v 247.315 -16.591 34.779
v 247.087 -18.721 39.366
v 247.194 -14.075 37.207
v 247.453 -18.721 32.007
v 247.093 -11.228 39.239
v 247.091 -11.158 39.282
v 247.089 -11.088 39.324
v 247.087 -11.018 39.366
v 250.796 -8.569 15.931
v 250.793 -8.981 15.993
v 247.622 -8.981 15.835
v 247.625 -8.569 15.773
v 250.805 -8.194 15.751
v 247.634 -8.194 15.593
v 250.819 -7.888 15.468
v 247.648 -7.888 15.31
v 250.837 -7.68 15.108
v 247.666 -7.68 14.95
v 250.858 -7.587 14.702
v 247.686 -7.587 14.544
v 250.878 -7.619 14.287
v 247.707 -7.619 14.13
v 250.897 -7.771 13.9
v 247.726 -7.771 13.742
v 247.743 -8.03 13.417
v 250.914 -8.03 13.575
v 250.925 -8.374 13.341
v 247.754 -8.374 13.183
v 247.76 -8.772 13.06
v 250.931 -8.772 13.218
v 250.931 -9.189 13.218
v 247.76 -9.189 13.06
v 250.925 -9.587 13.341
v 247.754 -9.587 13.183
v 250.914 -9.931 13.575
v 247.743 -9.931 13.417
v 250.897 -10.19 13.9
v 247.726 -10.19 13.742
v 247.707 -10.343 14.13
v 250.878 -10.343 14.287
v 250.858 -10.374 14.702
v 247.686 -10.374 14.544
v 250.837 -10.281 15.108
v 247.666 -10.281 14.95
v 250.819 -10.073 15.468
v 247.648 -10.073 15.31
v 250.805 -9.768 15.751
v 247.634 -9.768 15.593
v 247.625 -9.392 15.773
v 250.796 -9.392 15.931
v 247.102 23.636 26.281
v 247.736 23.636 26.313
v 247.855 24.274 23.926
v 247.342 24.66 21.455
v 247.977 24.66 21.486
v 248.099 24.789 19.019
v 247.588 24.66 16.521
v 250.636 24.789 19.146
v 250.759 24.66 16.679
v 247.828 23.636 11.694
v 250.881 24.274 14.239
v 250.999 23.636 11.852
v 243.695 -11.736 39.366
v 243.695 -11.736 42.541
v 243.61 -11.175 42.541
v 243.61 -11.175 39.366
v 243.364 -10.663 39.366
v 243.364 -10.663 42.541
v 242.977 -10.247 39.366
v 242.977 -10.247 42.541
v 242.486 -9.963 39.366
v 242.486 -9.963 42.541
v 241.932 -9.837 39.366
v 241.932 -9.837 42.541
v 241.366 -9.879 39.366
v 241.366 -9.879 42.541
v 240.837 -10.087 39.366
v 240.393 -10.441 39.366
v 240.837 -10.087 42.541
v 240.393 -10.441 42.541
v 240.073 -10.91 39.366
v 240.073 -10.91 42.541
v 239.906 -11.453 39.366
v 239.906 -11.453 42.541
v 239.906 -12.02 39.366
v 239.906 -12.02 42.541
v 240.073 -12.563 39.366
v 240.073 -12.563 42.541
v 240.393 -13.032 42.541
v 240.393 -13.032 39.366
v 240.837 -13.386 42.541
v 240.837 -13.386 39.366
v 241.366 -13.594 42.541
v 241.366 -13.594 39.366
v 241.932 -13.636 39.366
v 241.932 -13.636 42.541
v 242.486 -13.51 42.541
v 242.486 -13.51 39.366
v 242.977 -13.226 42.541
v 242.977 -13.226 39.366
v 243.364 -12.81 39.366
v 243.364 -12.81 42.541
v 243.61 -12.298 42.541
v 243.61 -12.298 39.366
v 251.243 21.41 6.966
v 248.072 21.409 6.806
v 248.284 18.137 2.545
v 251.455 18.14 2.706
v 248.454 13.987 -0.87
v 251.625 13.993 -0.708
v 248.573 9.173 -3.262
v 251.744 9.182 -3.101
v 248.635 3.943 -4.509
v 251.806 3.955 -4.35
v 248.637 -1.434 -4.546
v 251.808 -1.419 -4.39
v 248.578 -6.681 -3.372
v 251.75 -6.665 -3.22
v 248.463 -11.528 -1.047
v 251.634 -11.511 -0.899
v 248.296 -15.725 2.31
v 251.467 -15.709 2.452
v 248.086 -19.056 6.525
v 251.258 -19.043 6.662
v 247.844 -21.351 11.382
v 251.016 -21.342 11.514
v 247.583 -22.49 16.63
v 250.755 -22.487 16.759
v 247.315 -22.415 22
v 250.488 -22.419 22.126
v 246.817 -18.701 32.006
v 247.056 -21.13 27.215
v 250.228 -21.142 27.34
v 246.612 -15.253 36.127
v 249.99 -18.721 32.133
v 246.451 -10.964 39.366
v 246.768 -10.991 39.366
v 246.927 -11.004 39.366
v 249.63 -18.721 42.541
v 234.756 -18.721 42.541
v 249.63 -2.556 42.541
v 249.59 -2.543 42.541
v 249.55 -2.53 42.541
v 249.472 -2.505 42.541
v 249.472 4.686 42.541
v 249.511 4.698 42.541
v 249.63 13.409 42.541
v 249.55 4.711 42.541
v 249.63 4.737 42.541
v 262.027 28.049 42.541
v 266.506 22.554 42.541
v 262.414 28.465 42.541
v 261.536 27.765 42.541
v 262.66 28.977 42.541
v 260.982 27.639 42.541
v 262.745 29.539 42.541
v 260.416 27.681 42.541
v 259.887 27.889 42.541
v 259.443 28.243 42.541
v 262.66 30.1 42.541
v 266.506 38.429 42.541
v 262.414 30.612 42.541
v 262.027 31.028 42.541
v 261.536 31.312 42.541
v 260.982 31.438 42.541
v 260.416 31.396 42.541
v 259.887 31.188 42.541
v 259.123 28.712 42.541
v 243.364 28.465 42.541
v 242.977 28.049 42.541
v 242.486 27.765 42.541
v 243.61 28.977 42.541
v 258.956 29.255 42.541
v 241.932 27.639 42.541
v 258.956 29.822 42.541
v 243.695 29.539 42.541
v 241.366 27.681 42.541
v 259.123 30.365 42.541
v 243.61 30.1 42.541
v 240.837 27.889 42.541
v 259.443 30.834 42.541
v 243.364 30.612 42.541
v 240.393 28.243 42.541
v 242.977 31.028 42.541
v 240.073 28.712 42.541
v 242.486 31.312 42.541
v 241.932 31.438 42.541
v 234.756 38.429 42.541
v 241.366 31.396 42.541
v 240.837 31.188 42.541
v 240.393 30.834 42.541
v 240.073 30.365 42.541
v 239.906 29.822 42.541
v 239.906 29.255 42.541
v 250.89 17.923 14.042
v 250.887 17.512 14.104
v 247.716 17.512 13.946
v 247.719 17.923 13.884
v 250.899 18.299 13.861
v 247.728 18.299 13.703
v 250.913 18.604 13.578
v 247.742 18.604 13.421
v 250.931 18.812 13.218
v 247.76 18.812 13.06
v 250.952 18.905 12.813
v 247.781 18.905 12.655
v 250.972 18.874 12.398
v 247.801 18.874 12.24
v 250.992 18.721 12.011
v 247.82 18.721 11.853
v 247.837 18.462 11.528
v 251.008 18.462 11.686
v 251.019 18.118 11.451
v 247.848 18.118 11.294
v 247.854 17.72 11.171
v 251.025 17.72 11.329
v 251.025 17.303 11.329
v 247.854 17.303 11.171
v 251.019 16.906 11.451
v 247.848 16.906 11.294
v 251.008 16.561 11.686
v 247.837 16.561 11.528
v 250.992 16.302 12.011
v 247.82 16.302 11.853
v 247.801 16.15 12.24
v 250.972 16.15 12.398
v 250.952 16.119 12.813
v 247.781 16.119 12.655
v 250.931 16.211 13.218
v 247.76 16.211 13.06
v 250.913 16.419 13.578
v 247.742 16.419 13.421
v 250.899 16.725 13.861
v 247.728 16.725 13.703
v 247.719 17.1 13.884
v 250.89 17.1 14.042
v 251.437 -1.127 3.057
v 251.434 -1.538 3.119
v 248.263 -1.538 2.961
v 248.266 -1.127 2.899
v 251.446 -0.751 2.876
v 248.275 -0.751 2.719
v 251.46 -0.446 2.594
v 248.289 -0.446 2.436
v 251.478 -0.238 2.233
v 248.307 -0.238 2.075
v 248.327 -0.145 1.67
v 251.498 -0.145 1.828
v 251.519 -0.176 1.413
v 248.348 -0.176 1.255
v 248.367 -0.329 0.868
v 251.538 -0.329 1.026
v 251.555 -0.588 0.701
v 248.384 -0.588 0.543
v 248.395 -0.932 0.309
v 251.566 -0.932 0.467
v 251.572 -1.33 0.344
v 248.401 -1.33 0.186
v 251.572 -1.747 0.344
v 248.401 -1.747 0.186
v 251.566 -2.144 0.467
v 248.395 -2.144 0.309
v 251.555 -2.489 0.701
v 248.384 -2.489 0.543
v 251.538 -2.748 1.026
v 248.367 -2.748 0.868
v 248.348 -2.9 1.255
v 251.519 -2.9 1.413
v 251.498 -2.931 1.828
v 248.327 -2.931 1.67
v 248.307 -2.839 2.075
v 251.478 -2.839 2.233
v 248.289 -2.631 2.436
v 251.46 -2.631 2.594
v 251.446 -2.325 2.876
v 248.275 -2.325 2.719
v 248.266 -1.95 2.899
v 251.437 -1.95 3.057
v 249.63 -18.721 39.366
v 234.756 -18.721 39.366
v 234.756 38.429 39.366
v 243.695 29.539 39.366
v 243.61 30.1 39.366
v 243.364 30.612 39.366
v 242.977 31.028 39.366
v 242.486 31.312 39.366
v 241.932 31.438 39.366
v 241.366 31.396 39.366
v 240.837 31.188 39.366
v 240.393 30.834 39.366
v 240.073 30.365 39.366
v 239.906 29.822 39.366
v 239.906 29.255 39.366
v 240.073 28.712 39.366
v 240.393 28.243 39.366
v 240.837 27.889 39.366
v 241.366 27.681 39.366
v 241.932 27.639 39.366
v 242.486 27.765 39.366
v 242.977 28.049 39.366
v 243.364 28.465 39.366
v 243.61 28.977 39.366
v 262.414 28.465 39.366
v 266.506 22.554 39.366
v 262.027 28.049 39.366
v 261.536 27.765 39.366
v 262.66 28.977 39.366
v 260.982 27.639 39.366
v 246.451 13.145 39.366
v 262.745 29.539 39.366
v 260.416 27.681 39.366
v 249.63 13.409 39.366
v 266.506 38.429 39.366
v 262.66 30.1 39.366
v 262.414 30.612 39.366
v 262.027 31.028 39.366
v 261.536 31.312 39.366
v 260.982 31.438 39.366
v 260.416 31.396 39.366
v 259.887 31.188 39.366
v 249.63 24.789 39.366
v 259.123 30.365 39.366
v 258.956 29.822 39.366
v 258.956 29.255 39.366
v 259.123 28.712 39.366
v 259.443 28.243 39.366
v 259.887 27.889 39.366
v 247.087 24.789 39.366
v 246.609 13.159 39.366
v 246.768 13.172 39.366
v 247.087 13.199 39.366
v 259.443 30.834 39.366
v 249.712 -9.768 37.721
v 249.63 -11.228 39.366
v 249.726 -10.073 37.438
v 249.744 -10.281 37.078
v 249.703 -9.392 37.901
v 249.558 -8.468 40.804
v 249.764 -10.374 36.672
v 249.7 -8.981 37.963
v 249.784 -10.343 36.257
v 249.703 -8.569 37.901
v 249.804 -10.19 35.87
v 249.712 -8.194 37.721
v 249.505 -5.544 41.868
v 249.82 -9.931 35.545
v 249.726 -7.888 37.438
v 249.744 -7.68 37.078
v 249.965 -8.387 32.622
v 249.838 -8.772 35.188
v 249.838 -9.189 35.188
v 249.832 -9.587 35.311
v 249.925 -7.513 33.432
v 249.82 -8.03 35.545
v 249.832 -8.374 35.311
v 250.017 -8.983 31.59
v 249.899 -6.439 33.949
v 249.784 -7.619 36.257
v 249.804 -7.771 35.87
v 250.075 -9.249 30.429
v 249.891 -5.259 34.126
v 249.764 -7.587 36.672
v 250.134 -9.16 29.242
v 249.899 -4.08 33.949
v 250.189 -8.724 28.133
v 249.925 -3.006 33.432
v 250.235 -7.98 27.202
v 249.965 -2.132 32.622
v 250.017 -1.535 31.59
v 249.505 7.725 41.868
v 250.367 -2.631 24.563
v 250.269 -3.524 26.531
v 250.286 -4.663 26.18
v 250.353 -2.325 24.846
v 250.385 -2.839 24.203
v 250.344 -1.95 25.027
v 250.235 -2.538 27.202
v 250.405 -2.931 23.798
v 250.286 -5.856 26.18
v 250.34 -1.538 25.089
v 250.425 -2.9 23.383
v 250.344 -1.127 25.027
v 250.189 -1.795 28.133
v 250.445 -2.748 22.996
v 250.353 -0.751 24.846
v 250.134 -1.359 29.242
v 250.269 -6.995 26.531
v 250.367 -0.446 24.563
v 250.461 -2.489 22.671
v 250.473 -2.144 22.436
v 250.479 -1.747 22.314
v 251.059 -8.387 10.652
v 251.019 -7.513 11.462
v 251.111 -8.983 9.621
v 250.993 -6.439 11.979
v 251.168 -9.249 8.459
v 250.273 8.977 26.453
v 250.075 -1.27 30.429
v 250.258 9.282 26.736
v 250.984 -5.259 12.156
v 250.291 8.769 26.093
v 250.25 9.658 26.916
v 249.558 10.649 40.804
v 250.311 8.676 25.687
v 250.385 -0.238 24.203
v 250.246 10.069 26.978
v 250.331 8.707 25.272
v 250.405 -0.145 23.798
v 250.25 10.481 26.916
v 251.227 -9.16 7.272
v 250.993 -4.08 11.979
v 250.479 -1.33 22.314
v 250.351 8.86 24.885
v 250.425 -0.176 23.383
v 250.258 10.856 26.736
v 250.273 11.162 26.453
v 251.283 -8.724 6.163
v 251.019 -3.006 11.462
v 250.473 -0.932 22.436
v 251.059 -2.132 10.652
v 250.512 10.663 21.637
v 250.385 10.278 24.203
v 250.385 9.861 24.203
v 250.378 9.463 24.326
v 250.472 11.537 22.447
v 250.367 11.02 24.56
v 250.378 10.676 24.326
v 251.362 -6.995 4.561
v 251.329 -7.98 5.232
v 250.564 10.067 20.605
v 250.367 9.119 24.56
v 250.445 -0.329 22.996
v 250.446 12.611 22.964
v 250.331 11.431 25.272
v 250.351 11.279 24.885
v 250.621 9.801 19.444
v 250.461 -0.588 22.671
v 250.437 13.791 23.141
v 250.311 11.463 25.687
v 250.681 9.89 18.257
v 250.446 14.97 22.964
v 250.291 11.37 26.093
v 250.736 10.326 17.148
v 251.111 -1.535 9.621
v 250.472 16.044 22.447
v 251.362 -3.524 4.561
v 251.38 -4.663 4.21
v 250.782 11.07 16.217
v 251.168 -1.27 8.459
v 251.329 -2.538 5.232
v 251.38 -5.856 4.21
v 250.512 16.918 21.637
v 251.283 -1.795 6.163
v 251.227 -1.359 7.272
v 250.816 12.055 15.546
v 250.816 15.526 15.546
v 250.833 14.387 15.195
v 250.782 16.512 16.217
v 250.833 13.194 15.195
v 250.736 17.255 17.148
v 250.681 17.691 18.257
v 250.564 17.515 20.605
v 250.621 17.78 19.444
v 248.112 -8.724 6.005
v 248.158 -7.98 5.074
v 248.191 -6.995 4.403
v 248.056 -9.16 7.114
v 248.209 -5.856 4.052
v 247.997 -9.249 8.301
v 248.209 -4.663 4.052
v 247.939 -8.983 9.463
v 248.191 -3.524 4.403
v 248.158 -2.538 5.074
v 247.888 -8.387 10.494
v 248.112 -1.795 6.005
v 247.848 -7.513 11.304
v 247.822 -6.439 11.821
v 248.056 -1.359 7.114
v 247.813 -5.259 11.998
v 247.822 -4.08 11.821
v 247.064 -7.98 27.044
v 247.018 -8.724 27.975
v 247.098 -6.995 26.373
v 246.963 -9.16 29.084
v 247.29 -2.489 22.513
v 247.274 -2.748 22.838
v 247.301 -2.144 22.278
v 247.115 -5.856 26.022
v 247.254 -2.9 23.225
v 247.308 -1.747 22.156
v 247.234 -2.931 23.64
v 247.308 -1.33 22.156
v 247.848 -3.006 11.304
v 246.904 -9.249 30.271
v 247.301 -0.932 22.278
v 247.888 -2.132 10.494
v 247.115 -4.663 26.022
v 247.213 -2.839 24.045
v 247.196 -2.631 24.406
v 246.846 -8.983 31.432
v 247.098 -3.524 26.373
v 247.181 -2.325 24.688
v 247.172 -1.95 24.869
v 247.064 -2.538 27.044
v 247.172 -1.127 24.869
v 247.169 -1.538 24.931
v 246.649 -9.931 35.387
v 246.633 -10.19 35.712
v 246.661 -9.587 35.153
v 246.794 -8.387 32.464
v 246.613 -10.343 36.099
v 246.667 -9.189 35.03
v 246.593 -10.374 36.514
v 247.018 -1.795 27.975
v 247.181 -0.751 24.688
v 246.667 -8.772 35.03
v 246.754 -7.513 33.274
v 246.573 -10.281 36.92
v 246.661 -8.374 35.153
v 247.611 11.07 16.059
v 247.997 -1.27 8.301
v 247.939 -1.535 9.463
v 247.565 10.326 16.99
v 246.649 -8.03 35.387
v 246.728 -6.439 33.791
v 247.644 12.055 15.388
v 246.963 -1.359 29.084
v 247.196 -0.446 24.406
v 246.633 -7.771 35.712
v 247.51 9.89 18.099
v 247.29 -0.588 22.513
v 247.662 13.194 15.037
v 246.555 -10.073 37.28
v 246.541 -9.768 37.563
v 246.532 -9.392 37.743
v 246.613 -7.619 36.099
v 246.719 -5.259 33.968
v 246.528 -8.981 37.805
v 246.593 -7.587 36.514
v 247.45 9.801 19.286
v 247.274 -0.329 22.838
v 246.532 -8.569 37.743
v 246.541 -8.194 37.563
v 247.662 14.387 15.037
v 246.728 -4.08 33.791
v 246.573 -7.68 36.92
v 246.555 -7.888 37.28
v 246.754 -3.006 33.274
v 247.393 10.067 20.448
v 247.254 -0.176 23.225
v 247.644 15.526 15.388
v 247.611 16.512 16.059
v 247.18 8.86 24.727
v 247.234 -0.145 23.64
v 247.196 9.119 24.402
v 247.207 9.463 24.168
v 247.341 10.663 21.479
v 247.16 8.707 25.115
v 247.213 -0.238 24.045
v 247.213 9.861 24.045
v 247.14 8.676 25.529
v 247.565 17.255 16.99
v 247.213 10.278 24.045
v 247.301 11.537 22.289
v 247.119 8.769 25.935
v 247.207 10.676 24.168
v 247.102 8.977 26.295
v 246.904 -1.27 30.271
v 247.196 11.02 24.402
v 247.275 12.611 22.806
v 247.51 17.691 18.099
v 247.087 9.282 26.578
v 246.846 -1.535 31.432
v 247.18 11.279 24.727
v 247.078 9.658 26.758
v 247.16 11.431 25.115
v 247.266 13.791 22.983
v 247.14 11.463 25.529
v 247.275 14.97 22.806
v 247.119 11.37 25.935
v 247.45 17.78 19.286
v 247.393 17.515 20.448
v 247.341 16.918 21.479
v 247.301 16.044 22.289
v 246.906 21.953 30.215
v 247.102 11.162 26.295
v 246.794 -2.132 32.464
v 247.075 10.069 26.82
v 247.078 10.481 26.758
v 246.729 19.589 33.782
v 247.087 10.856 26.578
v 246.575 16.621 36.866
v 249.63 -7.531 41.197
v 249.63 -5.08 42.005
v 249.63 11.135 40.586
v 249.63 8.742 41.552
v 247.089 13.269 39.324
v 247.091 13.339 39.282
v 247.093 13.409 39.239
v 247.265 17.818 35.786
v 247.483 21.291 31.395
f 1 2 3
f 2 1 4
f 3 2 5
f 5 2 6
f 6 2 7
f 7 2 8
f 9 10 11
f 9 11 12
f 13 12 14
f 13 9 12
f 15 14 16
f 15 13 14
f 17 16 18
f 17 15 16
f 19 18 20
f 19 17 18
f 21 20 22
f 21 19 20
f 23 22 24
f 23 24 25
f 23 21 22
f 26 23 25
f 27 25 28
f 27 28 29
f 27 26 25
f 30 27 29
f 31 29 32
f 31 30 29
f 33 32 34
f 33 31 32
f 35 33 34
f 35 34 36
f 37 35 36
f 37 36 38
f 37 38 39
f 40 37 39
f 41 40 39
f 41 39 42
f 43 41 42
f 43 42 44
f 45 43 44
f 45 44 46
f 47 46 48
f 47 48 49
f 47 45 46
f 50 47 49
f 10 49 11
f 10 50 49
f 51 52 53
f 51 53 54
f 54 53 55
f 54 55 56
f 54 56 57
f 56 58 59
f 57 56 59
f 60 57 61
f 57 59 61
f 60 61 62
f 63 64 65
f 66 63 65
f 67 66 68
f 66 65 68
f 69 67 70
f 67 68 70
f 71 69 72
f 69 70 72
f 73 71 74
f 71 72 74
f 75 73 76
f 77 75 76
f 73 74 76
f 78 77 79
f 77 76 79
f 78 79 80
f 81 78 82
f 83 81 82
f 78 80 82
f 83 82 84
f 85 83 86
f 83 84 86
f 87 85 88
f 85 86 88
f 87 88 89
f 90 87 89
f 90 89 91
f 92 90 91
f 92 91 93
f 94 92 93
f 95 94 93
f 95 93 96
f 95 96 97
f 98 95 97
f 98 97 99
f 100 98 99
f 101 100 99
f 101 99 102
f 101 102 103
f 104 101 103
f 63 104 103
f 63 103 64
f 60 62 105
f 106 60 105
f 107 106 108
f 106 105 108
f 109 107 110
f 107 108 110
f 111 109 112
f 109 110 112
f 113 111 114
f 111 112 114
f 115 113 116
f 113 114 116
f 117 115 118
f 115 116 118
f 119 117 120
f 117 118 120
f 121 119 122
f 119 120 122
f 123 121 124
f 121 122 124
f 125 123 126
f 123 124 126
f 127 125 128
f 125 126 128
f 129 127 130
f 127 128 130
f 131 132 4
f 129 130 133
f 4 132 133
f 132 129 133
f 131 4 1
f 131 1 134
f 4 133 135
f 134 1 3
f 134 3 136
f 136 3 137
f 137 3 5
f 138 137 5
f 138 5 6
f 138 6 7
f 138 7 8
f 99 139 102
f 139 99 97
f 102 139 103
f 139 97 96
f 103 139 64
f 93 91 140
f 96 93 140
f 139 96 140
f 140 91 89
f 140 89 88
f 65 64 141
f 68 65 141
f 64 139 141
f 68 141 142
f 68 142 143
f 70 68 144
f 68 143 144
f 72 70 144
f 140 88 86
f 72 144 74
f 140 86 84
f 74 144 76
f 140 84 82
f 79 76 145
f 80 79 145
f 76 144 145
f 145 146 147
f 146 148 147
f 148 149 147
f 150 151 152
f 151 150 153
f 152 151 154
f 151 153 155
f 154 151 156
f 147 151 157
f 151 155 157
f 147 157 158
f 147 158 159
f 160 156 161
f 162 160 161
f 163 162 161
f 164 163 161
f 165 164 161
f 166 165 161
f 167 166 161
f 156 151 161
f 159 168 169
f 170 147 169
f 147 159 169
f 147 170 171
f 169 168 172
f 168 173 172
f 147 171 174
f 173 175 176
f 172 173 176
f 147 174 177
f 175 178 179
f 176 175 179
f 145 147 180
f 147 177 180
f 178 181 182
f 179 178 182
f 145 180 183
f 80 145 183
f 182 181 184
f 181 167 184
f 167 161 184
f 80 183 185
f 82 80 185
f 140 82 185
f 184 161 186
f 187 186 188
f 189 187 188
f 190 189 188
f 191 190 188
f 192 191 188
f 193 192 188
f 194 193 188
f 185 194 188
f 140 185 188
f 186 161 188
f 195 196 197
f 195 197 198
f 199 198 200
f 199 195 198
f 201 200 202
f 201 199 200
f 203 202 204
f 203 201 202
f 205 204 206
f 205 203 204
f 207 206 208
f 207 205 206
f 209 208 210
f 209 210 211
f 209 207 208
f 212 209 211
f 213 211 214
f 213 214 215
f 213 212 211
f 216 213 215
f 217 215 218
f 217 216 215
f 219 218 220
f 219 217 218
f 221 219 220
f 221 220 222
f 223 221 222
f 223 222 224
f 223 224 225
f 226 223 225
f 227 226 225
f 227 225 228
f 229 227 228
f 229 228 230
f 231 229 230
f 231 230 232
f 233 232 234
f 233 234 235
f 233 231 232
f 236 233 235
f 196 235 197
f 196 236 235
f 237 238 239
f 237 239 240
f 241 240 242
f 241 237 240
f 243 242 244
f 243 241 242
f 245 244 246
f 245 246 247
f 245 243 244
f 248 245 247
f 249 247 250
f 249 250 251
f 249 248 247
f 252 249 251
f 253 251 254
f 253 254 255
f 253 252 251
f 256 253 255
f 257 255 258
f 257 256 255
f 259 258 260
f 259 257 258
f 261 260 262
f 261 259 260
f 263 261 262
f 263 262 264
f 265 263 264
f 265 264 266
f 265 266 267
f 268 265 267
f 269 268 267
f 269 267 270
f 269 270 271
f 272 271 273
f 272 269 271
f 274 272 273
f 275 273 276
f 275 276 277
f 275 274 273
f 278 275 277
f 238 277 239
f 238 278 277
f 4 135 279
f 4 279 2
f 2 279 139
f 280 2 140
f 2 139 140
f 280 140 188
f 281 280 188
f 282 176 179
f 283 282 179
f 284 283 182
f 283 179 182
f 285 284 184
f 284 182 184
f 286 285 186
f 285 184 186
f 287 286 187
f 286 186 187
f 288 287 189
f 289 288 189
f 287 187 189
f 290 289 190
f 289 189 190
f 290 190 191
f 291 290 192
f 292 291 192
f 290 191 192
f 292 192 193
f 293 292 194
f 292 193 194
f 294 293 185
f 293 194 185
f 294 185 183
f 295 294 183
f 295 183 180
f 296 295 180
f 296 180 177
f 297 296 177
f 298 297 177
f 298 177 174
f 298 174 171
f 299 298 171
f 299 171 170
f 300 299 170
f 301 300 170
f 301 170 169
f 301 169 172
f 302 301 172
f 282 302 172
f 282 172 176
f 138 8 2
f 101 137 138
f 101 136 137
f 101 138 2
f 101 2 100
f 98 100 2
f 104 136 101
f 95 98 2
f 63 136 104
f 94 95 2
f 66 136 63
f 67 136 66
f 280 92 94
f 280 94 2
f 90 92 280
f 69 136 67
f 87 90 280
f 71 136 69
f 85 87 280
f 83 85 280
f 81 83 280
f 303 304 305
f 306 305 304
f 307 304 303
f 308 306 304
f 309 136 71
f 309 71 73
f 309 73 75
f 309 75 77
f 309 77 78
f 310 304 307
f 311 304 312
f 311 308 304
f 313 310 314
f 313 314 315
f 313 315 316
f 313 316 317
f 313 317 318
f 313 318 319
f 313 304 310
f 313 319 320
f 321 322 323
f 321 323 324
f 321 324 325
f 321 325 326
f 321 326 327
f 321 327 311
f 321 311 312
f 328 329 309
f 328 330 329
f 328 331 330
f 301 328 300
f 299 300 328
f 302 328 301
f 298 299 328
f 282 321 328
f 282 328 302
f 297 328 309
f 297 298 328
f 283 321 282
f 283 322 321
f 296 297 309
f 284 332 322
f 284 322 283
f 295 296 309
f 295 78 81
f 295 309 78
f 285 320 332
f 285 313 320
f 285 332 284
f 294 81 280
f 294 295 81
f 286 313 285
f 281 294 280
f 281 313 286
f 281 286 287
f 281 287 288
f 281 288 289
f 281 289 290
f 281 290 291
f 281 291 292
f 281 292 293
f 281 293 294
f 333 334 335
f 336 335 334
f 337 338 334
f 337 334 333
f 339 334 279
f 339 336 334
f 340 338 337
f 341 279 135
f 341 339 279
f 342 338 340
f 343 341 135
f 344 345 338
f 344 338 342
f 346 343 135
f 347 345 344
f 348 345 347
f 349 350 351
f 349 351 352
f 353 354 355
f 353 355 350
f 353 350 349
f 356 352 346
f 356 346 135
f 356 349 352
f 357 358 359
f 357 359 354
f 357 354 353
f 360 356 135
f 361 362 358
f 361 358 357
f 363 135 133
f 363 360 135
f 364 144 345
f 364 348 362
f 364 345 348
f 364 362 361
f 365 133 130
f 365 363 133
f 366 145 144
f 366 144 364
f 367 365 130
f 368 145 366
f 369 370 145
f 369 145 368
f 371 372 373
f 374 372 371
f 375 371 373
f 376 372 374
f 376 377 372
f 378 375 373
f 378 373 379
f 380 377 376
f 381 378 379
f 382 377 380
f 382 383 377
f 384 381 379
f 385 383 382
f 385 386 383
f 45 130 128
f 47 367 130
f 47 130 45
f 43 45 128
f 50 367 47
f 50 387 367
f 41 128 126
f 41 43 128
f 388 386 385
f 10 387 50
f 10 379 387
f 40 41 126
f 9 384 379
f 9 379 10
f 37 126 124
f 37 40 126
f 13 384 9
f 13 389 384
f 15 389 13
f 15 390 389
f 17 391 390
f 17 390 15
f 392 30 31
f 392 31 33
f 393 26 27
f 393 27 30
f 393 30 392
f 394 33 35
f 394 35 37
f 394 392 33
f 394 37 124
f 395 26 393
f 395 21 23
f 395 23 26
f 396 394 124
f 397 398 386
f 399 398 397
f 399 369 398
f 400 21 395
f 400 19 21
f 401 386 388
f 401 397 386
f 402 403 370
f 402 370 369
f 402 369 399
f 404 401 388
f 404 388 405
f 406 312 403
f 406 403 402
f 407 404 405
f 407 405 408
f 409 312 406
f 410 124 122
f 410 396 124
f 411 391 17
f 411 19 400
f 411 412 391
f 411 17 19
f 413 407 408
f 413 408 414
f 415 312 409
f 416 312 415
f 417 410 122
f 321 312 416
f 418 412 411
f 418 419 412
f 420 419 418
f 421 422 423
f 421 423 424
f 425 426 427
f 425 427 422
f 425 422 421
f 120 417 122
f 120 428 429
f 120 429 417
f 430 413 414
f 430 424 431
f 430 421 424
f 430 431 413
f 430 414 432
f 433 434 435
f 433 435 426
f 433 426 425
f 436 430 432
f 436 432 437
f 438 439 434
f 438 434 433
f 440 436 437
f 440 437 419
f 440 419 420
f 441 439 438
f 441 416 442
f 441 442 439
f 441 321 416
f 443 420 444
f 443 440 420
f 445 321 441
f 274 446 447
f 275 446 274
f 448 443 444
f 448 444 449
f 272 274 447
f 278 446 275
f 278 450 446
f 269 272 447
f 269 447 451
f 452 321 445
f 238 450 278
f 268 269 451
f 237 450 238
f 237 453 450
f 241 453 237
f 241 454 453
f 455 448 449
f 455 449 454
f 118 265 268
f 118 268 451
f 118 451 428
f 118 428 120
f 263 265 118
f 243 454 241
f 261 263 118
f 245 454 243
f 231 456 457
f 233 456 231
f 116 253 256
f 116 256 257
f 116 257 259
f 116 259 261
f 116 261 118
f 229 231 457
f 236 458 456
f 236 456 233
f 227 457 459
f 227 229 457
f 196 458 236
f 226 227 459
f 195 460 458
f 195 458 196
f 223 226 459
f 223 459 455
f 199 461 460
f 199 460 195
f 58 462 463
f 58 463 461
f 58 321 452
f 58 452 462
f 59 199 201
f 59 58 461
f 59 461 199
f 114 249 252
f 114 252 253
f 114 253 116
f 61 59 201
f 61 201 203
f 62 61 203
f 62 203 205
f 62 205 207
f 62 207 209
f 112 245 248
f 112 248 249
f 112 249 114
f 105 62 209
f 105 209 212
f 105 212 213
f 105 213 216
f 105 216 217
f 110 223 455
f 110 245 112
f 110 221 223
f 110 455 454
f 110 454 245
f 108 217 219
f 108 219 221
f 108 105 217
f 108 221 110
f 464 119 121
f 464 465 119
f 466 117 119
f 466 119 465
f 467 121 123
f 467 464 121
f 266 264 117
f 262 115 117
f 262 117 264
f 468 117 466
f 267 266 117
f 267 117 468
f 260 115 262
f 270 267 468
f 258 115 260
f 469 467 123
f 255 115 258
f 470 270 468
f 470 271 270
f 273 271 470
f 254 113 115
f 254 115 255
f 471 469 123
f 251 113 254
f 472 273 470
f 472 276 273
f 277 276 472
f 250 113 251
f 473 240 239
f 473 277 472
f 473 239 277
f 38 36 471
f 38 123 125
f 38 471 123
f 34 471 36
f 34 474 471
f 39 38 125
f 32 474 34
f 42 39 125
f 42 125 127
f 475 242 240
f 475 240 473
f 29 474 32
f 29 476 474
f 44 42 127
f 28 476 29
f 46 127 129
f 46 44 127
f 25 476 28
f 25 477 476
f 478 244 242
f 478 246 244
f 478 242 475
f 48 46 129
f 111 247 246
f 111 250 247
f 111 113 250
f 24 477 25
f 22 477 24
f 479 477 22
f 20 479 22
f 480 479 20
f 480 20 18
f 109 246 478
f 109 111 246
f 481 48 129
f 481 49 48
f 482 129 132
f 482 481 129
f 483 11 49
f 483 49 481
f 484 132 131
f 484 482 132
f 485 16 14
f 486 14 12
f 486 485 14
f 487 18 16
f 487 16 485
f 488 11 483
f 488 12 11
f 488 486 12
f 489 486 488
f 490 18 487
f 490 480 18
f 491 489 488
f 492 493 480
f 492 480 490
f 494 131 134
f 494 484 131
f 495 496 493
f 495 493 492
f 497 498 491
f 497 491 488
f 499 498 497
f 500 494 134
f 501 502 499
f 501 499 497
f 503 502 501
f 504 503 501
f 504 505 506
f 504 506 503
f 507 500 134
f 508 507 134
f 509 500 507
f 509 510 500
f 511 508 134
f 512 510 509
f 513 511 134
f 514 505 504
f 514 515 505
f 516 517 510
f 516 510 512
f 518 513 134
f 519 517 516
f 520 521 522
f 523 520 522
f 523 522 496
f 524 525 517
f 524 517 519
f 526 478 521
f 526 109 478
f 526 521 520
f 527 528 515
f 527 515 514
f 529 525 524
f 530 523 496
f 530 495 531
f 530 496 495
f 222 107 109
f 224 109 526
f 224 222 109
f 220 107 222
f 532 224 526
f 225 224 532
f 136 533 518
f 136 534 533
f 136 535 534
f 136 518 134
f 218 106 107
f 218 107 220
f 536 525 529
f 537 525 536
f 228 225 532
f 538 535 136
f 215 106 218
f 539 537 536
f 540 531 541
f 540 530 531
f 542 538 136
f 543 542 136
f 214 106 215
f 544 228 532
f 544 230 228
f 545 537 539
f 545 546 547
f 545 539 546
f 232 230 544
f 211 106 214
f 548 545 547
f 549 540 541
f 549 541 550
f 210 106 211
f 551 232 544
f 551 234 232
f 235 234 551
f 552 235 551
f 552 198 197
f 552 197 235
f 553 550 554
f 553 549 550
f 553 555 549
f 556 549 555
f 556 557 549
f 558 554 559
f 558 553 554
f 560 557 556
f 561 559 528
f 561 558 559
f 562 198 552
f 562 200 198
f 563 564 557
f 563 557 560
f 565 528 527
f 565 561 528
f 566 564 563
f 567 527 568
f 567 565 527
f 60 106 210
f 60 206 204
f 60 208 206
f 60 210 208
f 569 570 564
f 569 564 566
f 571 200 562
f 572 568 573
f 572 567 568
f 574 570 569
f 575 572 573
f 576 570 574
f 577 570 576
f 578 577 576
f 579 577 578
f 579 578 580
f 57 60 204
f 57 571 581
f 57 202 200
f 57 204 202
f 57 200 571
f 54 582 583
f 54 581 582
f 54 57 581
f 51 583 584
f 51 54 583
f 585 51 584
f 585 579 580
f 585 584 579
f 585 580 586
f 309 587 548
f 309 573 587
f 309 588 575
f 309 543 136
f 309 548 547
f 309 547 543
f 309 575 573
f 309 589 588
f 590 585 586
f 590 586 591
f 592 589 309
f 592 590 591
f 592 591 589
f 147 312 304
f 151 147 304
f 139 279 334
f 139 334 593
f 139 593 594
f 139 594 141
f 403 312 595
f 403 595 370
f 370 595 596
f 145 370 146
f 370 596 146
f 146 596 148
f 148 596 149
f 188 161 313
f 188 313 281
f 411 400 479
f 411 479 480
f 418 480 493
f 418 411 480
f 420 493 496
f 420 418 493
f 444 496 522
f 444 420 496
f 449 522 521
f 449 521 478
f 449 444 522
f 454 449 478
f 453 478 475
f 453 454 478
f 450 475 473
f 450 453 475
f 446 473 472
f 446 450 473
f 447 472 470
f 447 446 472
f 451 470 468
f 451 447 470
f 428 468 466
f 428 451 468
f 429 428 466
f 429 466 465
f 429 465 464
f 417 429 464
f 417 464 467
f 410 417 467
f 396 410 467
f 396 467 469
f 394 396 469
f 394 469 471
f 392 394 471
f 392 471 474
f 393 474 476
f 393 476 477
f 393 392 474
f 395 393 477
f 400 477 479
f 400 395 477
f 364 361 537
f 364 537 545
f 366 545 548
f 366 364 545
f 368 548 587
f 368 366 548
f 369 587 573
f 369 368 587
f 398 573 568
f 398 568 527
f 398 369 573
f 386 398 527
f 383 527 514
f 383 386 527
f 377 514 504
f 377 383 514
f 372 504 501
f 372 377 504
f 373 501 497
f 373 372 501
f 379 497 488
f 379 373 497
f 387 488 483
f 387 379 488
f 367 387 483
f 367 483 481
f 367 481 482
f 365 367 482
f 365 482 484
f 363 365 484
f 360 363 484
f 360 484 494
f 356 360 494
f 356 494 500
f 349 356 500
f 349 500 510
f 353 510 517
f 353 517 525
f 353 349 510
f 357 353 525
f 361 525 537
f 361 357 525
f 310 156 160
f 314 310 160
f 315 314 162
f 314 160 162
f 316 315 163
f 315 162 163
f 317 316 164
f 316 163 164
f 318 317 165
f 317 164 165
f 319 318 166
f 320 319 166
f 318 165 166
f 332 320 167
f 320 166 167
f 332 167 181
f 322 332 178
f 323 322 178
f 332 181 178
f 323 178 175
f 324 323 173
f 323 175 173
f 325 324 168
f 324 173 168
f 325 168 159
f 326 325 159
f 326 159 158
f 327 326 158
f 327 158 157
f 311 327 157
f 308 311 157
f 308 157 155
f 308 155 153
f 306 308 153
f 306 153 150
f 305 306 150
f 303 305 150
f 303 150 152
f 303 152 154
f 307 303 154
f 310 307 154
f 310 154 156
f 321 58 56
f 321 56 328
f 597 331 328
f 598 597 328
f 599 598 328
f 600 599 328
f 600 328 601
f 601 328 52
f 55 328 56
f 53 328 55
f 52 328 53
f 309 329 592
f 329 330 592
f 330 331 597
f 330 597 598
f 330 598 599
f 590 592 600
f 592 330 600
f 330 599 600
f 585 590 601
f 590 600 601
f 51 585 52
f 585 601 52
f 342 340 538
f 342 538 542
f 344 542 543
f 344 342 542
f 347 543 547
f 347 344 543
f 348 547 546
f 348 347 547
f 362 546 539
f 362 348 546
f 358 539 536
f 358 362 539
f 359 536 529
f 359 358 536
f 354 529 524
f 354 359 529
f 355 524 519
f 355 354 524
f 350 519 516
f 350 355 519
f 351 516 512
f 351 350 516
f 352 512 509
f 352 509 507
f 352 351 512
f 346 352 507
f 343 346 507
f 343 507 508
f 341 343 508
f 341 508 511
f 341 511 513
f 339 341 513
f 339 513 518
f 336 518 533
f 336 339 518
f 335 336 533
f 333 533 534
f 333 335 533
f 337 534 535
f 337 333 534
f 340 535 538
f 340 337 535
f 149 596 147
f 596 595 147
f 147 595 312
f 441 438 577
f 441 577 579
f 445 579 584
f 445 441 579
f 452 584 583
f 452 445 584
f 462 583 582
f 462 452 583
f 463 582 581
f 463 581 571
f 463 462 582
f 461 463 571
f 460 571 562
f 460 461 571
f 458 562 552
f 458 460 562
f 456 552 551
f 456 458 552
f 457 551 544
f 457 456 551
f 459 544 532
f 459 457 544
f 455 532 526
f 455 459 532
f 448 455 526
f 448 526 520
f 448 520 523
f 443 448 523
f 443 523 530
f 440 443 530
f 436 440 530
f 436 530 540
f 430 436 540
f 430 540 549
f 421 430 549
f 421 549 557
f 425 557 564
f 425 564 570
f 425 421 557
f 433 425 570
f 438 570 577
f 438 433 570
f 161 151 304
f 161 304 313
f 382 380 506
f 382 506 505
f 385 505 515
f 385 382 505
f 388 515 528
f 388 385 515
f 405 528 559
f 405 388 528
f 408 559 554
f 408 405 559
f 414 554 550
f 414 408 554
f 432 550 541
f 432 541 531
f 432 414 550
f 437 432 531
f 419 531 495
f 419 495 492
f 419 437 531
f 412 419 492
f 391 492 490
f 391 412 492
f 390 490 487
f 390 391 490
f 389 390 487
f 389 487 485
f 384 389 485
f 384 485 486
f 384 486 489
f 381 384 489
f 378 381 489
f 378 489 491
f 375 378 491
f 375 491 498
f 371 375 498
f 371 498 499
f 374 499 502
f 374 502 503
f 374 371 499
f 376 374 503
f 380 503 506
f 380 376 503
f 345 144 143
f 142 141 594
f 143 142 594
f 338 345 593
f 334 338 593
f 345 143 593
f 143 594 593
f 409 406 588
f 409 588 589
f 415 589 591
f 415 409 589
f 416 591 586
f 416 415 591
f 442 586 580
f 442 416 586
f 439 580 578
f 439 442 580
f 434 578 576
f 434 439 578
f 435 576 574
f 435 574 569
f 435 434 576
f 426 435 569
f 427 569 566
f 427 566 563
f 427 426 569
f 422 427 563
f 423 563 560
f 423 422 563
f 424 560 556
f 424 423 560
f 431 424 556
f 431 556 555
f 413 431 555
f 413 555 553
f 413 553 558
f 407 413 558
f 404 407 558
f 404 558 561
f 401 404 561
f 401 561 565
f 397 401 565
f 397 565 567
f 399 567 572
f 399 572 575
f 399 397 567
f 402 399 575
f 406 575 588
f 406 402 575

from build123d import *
from build123d.topology import SkipClean

# Parameters (mm, degrees)
SKETCH1_R           = 1.397
SKETCH1_R_2         = 4.0005
BOSS_EXTRUDE1_DEPTH = 3.175
SKETCH2_W           = 31.75
SKETCH2_H           = 57.15
BOSS_EXTRUDE2_DEPTH = 3.175
CUT_EXTRUDE2_DEPTH  = 3.175
CUT_EXTRUDE3_START  = 2.54
SKETCH4_R           = 23.6982
CUT_EXTRUDE3_DEPTH  = 2.54
SKETCH5_W           = 14.873793878
SKETCH5_H           = 32.130520557
CUT_EXTRUDE4_DEPTH  = 2.54
BOSS_EXTRUDE3_DEPTH = 2.54
SKETCH9_R           = 1.905
CUT_EXTRUDE6_DEPTH  = 6.35


with BuildPart() as part:
    # Sketch1 → Boss-Extrude1 (new body)
    # profile 1 of 2: a face of its own
    with BuildSketch(Plane(origin=(250.96748785, 0, 12.493901655), x_dir=(-0.04972137386865806, 0, 0.9987631275635946), z_dir=(-0.9987631275635946, -1.0338951916821772e-15, -0.04972137386865806))):
        with BuildLine():
            ThreePointArc((-0.642468938, 23.635575071), (-7.278200133, -18.075315821), (30.358231062, 1.090549523))
            ThreePointArc((30.358231062, 1.090549523), (25.825896406, 15.028780719), (13.962531062, 23.635575071))
            Line((13.962531062, 23.635575071), (13.962531062, 22.014532559))
            ThreePointArc((13.962531062, 22.014532559), (6.660031062, 2.792349523), (-0.642468938, 22.014532559))
            Line((-0.642468938, 22.014532559), (-0.642468938, 23.635575071))
        make_face()
        with Locations((2.106642694, -8.980550477)):
            Circle(SKETCH1_R, mode=Mode.SUBTRACT)
        with Locations((24.103687951, -8.980550477)):
            Circle(SKETCH1_R, mode=Mode.SUBTRACT)
        with Locations((-10.783625826, -1.538350477)):
            Circle(SKETCH1_R, mode=Mode.SUBTRACT)
        with Locations((-4.338491566, -5.259450477)):
            Circle(SKETCH1_R_2, mode=Mode.SUBTRACT)
        with Locations((17.658553691, -5.259450477)):
            Circle(SKETCH1_R_2, mode=Mode.SUBTRACT)
        with Locations((11.21341943, -1.538350477)):
            Circle(SKETCH1_R, mode=Mode.SUBTRACT)
    # profile 2 of 2: a face of its own
    with BuildSketch(Plane(origin=(250.96748785, 0, 12.493901655), x_dir=(-0.04972137386865806, 0, 0.9987631275635946), z_dir=(-0.9987631275635946, -1.0338951916821772e-15, -0.04972137386865806))):
        with BuildLine():
            Line((13.962531062, 22.014532559), (13.962531062, 23.635575071))
            ThreePointArc((13.962531062, 23.635575071), (6.660031062, 24.788749523), (-0.642468938, 23.635575071))
            Line((-0.642468938, 23.635575071), (-0.642468938, 22.014532559))
            ThreePointArc((-0.642468938, 22.014532559), (6.660031062, 2.792349523), (13.962531062, 22.014532559))
        make_face()
        with Locations((6.660031062, 13.790549523)):
            Circle(SKETCH1_R_2, mode=Mode.SUBTRACT)
        with Locations((0.214896802, 17.511649523)):
            Circle(SKETCH1_R, mode=Mode.SUBTRACT)
        with Locations((13.105165323, 10.069449523)):
            Circle(SKETCH1_R, mode=Mode.SUBTRACT)
    extrude(amount=BOSS_EXTRUDE1_DEPTH)

    # Sketch2 → Boss-Extrude2 (add)
    with BuildSketch(Plane(origin=(0, 0, 42.540622794), x_dir=(-1, 0, 0), z_dir=(0, 0, -1))):
        with Locations((-250.630940448, 9.853549523)):
            Rectangle(SKETCH2_W, SKETCH2_H)
    extrude(amount=BOSS_EXTRUDE2_DEPTH)

    # Sketch3 → Cut-Extrude2 (cut)
    with BuildSketch(Plane(origin=(0, 0, 39.365622794), x_dir=(-1, 0, 0), z_dir=(0, 0, -1))):
        Polygon((-249.629734326, 13.40907008), (-266.505940448, 22.553549523), (-266.505940448, -18.721450477), (-249.629734326, -18.721450477), align=None)
    extrude(amount=-CUT_EXTRUDE2_DEPTH, mode=Mode.SUBTRACT)

    # Sketch4 → Cut-Extrude3 (cut)
    with SkipClean():  # the faces are left unmerged after this step: merging them gives an invalid solid
        with BuildSketch(Plane(origin=(250.96748785, 0, 12.493901655), x_dir=(0.049721373868658096, 0, -0.9987631275635946), z_dir=(0.9987631275635946, 1.3357370765021432e-15, 0.049721373868658096)).offset(CUT_EXTRUDE3_START)):
            with Locations((-6.660031062, 1.090549523)):
                Circle(SKETCH4_R)
        extrude(amount=-CUT_EXTRUDE3_DEPTH, mode=Mode.SUBTRACT)

    # Sketch5 → Cut-Extrude4 (cut)
    with SkipClean():  # the faces are left unmerged after this step: merging them gives an invalid solid
        with BuildSketch(Plane.XY.offset(42.540622794)):
            with Locations((242.192837387, -2.656190199)):
                Rectangle(SKETCH5_W, SKETCH5_H)
        extrude(amount=CUT_EXTRUDE4_DEPTH, mode=Mode.SUBTRACT)

    # Sketch6 → Boss-Extrude3 (add)
    with BuildSketch(Plane(origin=(250.96748785, 0, 12.493901655), x_dir=(0.049721373868658096, 0, -0.9987631275635946), z_dir=(0.9987631275635946, 1.335737076502143e-15, 0.049721373868658096))):
        with BuildLine():
            ThreePointArc((-26.904999191, 13.40907008), (-18.272048961, 21.748858349), (-6.660031062, 24.788749523))
            Line((-6.660031062, 24.788749523), (-30.076072121, 24.788749523))
            Line((-30.076072121, 24.788749523), (-30.076072121, 13.40907008))
            Line((-30.076072121, 13.40907008), (-30.076072121, 4.736602785))
            ThreePointArc((-30.076072121, 4.736602785), (-28.91702666, 9.228782144), (-26.904999191, 13.40907008))
        make_face()
        with BuildLine():
            Line((-30.076072121, -2.55550374), (-30.076072121, -18.721450477))
            Line((-30.076072121, -18.721450477), (-19.663466733, -18.721450477))
            ThreePointArc((-19.663466733, -18.721450477), (-23.70122079, -15.377678552), (-26.904999191, -11.227971035))
            ThreePointArc((-26.904999191, -11.227971035), (-28.91702666, -7.047683098), (-30.076072121, -2.55550374))
        make_face()
    extrude(amount=-BOSS_EXTRUDE3_DEPTH)

    # Sketch9 → Cut-Extrude6 (cut)
    with BuildSketch(Plane.XY.offset(42.540622794)):
        with Locations((260.839665535, 29.538549523)):
            Circle(SKETCH9_R)
        with Locations((241.789665535, 29.538549523)):
            Circle(SKETCH9_R)
        with Locations((241.789665535, -11.736450477)):
            Circle(SKETCH9_R)
    extrude(amount=-CUT_EXTRUDE6_DEPTH, mode=Mode.SUBTRACT)


solid = part.part
